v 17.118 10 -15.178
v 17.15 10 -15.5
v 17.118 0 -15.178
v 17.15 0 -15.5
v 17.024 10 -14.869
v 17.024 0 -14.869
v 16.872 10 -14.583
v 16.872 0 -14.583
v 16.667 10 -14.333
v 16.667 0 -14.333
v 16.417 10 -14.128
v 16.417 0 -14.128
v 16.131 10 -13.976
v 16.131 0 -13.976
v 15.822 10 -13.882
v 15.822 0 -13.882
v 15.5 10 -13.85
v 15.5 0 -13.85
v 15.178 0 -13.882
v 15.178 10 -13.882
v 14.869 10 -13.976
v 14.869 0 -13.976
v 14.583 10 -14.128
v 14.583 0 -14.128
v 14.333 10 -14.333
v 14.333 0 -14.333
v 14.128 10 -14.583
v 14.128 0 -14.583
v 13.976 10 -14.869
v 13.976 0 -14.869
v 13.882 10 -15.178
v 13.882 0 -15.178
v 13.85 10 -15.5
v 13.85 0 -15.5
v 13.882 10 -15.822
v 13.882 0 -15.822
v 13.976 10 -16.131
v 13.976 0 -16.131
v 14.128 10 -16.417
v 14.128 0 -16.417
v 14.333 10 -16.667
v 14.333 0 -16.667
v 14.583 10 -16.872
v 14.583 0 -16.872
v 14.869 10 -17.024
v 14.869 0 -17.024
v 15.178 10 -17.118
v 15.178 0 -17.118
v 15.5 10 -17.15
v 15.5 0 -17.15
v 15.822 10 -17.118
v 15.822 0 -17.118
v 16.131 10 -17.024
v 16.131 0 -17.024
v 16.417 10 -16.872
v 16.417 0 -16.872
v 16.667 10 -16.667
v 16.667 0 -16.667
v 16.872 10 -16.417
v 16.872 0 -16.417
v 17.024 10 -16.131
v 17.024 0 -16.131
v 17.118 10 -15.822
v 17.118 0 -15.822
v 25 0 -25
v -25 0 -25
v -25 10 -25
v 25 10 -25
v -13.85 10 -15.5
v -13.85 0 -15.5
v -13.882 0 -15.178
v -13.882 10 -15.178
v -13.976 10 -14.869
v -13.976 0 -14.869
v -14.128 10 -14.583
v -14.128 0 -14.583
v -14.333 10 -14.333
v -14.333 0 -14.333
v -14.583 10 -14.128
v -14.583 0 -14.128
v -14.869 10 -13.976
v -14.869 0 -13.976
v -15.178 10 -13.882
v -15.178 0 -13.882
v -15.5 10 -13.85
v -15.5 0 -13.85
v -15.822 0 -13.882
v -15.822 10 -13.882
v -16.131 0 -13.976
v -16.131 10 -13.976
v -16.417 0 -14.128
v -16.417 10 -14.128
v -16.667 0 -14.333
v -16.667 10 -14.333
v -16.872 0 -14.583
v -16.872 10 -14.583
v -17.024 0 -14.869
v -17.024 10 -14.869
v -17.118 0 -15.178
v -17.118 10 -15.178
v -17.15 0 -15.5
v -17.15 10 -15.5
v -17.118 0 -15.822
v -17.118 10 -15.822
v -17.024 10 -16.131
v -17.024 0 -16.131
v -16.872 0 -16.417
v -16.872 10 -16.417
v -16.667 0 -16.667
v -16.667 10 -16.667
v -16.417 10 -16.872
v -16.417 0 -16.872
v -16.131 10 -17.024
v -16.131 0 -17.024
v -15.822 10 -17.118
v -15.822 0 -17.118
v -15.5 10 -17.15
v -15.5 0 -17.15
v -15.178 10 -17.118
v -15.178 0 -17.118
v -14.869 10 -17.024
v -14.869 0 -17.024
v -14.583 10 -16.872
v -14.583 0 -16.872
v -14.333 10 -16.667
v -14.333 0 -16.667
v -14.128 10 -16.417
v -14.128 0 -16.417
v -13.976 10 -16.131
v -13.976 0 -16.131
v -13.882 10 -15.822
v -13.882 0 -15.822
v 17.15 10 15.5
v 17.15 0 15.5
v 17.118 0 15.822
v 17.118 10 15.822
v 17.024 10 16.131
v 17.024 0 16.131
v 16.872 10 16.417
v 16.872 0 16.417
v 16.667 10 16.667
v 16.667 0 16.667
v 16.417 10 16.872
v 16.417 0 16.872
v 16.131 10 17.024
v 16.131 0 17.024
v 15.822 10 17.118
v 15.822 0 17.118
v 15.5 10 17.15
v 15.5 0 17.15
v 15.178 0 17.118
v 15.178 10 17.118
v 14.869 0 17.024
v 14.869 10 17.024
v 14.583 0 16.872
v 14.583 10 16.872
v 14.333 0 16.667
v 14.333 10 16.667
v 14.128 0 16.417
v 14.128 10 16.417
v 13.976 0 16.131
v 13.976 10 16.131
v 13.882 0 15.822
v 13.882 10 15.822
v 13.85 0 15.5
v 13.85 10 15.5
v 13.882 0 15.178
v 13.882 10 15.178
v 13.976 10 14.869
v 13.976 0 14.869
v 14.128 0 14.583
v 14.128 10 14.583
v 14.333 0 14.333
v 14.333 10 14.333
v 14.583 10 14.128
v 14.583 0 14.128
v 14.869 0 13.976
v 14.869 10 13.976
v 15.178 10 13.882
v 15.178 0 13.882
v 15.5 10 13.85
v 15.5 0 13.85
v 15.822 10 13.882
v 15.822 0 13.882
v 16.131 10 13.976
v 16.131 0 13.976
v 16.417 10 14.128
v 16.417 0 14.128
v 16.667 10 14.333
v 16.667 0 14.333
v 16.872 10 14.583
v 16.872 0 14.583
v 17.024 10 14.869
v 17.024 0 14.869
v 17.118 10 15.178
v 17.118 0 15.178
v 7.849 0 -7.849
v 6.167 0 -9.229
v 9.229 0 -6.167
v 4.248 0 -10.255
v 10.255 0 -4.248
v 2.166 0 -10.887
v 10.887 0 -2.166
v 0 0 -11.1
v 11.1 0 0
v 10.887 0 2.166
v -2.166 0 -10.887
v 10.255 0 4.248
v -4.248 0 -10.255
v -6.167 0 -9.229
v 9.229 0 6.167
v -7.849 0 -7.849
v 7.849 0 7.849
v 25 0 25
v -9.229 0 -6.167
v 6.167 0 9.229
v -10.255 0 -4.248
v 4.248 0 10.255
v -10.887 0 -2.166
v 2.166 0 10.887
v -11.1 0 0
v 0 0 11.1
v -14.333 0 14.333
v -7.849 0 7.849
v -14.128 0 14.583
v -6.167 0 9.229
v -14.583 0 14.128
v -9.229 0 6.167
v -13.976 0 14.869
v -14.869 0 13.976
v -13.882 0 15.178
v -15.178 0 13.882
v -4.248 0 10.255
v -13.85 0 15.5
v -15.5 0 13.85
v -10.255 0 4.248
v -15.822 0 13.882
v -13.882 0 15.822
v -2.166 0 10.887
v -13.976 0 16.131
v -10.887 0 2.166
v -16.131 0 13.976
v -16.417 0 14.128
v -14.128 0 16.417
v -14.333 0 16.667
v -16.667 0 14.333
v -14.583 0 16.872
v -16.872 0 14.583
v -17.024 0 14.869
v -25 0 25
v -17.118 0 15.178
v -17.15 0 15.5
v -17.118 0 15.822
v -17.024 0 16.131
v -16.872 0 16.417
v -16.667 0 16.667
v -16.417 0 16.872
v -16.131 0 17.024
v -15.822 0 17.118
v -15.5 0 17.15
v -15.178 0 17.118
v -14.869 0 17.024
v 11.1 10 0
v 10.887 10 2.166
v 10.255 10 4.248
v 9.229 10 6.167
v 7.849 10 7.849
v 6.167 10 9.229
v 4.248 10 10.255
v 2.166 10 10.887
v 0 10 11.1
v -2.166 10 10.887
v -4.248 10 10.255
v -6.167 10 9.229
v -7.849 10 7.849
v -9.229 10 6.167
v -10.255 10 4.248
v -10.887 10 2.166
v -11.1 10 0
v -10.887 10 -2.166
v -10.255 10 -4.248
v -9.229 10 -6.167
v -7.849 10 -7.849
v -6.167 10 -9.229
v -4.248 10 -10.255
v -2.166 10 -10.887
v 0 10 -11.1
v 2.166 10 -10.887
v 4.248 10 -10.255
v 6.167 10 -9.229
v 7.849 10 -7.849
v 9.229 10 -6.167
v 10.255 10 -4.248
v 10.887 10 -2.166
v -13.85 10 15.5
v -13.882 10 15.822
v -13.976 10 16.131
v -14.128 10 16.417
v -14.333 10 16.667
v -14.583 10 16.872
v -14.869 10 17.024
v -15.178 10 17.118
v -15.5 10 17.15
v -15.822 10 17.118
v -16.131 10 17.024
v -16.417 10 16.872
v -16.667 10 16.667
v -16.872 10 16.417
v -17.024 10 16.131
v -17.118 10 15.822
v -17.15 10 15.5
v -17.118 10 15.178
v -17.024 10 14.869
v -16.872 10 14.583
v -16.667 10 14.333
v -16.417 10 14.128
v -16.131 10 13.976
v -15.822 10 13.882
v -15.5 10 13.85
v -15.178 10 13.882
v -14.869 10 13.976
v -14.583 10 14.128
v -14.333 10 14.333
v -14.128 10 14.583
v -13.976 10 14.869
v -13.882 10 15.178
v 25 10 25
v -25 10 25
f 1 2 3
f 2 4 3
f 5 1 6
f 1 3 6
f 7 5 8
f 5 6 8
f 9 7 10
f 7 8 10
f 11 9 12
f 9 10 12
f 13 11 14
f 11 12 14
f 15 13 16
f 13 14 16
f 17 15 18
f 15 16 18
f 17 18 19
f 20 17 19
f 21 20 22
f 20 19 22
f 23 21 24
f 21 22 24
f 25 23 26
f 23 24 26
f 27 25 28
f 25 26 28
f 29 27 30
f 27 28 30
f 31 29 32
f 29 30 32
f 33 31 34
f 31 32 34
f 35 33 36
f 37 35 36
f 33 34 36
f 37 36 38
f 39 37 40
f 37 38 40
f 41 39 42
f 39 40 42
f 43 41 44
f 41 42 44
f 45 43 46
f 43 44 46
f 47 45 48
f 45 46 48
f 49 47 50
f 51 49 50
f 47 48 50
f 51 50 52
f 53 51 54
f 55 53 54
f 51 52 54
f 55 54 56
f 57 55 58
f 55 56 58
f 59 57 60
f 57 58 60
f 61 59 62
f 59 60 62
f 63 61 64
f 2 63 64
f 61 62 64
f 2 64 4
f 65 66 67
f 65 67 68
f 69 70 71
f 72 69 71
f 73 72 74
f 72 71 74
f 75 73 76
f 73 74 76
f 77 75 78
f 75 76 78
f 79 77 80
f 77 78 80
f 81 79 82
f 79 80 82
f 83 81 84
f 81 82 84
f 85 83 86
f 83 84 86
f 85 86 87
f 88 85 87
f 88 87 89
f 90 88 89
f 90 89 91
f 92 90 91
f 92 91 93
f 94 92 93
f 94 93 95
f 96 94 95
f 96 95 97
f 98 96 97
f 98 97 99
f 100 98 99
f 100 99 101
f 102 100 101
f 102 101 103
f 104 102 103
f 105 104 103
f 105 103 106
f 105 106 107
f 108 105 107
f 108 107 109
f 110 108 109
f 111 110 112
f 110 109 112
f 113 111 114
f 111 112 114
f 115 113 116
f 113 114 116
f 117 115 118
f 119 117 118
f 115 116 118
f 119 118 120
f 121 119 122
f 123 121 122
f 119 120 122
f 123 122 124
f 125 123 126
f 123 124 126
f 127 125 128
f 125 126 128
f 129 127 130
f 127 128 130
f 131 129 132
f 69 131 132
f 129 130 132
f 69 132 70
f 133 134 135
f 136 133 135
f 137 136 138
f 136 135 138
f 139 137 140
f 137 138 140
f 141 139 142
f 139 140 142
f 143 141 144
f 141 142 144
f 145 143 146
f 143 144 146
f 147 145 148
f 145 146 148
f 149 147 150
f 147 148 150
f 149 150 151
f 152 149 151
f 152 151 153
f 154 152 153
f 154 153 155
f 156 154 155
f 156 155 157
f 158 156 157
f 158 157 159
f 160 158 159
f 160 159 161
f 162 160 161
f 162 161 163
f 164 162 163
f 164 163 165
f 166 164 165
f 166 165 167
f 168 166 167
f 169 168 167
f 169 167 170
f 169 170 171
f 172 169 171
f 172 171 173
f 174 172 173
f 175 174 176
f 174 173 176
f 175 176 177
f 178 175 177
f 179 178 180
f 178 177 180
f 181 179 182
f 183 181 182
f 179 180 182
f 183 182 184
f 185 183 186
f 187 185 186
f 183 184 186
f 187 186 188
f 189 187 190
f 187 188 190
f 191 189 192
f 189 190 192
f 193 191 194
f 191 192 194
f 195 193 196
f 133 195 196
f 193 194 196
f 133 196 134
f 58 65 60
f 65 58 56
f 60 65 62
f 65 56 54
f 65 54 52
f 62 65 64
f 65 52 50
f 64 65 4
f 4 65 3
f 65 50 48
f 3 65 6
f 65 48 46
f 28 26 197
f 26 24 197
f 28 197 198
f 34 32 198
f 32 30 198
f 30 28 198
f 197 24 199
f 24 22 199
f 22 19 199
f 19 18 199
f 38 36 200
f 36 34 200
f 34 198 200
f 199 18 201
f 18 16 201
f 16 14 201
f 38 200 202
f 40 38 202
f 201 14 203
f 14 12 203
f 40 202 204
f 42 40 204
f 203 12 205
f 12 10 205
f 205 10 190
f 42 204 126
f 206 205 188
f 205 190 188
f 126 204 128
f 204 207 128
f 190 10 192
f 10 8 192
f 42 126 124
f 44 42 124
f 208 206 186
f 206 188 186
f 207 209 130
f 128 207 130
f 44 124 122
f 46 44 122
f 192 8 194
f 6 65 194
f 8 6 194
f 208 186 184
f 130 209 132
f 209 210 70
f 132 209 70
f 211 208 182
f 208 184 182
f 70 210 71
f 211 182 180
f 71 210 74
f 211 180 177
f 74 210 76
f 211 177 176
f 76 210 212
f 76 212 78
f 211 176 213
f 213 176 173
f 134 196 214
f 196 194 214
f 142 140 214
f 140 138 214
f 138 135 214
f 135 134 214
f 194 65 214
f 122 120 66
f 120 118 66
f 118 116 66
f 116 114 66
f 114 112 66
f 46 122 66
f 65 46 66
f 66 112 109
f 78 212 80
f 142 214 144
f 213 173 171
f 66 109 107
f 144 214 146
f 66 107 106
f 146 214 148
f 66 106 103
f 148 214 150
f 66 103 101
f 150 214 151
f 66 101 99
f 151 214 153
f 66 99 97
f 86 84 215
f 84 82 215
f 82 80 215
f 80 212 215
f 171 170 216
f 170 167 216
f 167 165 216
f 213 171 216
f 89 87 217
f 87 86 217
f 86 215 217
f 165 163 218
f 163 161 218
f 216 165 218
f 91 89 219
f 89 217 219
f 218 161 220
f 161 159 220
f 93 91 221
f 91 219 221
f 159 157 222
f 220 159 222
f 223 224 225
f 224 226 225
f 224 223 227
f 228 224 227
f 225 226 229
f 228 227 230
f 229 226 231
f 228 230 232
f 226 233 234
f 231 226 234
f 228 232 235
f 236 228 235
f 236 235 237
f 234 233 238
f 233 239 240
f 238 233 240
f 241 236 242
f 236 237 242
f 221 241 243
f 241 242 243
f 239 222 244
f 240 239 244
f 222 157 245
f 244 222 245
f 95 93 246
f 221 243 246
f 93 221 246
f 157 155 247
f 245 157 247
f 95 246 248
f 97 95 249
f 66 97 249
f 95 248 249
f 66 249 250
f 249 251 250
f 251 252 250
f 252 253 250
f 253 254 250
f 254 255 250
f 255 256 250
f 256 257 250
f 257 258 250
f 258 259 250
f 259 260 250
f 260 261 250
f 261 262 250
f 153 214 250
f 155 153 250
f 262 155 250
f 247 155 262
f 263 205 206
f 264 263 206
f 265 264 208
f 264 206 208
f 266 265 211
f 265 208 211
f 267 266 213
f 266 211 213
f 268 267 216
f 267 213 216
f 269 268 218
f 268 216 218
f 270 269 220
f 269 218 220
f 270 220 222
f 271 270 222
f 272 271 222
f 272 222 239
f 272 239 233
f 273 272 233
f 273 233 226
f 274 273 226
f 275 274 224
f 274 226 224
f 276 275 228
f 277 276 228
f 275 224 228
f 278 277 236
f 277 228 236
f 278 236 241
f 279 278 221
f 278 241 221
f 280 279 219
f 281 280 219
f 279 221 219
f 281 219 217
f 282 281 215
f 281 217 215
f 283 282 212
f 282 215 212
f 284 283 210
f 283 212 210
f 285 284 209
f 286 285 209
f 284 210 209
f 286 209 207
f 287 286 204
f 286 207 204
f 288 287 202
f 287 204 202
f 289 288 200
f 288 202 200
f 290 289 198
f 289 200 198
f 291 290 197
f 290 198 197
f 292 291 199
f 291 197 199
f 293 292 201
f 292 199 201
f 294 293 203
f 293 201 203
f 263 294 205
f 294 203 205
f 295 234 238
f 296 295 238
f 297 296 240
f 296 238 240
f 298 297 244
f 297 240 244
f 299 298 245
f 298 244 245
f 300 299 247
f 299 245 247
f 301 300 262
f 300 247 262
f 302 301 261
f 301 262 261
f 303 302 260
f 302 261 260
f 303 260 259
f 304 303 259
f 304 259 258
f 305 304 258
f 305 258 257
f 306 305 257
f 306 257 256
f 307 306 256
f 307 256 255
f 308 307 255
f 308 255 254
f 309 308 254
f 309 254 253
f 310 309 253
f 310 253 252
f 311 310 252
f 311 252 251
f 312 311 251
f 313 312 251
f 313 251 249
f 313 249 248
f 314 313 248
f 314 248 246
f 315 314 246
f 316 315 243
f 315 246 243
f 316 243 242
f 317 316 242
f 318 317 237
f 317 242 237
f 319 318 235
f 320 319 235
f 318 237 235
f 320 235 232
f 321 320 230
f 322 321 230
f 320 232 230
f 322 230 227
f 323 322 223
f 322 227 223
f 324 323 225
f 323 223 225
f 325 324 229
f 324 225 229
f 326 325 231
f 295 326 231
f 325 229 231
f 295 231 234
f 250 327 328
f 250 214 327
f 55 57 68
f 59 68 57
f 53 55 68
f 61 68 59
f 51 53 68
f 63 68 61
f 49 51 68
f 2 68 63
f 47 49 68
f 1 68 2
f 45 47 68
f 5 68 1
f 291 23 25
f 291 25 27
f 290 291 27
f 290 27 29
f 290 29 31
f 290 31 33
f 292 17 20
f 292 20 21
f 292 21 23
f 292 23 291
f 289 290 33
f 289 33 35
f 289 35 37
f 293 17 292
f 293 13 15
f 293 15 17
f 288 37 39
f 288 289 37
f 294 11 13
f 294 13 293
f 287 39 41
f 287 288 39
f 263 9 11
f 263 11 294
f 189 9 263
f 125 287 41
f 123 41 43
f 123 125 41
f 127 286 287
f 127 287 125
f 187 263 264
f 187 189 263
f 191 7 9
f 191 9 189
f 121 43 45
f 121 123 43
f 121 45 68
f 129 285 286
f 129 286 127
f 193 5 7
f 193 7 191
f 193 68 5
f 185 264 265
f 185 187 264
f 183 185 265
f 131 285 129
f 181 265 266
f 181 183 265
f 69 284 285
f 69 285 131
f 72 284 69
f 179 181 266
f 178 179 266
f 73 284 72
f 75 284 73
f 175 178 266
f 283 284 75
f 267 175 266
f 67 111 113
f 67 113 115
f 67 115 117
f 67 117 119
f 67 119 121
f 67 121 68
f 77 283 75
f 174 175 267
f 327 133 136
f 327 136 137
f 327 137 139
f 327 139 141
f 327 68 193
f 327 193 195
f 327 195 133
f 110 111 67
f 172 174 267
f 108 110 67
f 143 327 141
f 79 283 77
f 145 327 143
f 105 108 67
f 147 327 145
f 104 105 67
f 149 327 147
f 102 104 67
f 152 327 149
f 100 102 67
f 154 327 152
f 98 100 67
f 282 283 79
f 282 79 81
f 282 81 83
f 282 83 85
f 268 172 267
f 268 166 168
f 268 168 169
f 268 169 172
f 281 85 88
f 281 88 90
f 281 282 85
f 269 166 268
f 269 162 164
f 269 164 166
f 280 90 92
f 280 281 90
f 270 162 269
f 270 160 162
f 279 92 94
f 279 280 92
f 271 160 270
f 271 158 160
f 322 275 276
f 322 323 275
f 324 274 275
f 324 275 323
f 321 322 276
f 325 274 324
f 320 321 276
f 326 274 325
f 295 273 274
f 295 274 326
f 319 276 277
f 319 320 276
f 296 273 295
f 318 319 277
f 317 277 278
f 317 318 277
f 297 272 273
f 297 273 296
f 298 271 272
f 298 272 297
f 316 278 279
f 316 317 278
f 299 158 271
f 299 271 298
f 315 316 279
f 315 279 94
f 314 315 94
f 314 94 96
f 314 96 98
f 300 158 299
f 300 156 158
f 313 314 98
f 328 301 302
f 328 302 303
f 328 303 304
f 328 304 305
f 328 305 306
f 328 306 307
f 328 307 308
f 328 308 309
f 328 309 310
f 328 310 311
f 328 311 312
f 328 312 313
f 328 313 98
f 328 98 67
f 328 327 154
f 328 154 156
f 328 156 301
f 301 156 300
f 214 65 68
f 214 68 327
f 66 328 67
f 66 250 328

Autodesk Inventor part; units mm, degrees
ref_plane "YZ Plane" through (0, 0, 0) normal (1, 0, 0) x (0, 1, 0)
ref_plane "XZ Plane" through (0, 0, 0) normal (0, 1, 0) x (-1, 0, 0)
ref_plane "XY Plane" through (0, 0, 0) normal (0, 0, 1) x (1, 0, 0)
sketch "Sketch1" plane through (0, 0, 0) normal (0, 1, 0) x (-1, 0, 0)
  line L0 (25, -25) -> (-25, -25)
  line L1 (-25, -25) -> (-25, 25)
  line L2 (-25, 25) -> (25, 25)
  line L3 (25, 25) -> (25, -25)
  line L4 (25, -25) -> (-25, 25) construction
  line L5 (-25, -25) -> (25, 25) construction
  point P0 (0, 0)
  dimension "d0" = 50
  dimension "d1" = 50
extrude "Extrusion1" add sketch "Sketch1" along normal blind 10
sketch "Sketch7" plane through (0, 0, 0) normal (0, -1, 0) x (1, 0, 0)
  circle A0 centre (0, 0) radius 11.1
  line L0 (-15.5, -15.5) -> (15.5, -15.5)
  line L1 (15.5, -15.5) -> (15.5, 15.5)
  line L2 (15.5, 15.5) -> (-15.5, 15.5)
  line L3 (-15.5, 15.5) -> (-15.5, -15.5)
  line L4 (-15.5, -15.5) -> (15.5, 15.5) construction
  line L5 (15.5, -15.5) -> (-15.5, 15.5) construction
  circle A1 centre (-15.5, 15.5) radius 1.65
  circle A2 centre (-15.5, -15.5) radius 1.65
  circle A3 centre (15.5, -15.5) radius 1.65
  circle A4 centre (15.5, 15.5) radius 1.65
  dimension "d60" = 22.2
  dimension "d61" = 31
  dimension "d62" = 31
  dimension "d63" = 3.3
  dimension "d66" = 360
extrude "Extrusion6" cut sketch "Sketch7" against normal up to next contours A0 | L3 A2 L0 | L0 A2 L3 | A3 L1 L0 | L0 L1 A3 | A1 L2 L3 | L3 L2 A1 | A4 L2 L1 | L1 L2 A4
sketch "Sketch4" plane through (0, 0, 0) normal (0, -1, 0) x (1, 0, 0)
  line L0 (25, -25) -> (25, 25) projected
  line L1 (0, -22.2) -> (0, 22.2) construction
  line L2 (11.5, -22.2) -> (11.5, 22.2)
  line L3 (-11.5, 22.2) -> (-11.5, -22.2)
  arc A0 (-11.5, -22.2) -> (11.5, -22.2) centre (0, -22.2) ccw
  arc A1 (11.5, 22.2) -> (-11.5, 22.2) centre (0, 22.2) ccw
  line L4 (15.5, -15.5) -> (-15.5, -15.5)
  line L5 (-15.5, -15.5) -> (-15.5, 15.5)
  line L6 (-15.5, 15.5) -> (15.5, 15.5)
  line L7 (15.5, 15.5) -> (15.5, -15.5)
  line L8 (15.5, -15.5) -> (-15.5, 15.5) construction
  line L9 (-15.5, -15.5) -> (15.5, 15.5) construction
  line L10 (-15.5, -6.7) -> (-15.5, 37.7) construction
  line L11 (-13.85, -6.7) -> (-13.85, 37.7)
  line L12 (-17.15, 37.7) -> (-17.15, -6.7)
  arc A2 (-17.15, -6.7) -> (-13.85, -6.7) centre (-15.5, -6.7) ccw
  arc A3 (-13.85, 37.7) -> (-17.15, 37.7) centre (-15.5, 37.7) ccw
  line L13 (15.5, -6.7) -> (15.5, 37.7) construction
  line L14 (17.15, -6.7) -> (17.15, 37.7)
  line L15 (13.85, 37.7) -> (13.85, -6.7)
  arc A4 (13.85, -6.7) -> (17.15, -6.7) centre (15.5, -6.7) ccw
  arc A5 (17.15, 37.7) -> (13.85, 37.7) centre (15.5, 37.7) ccw
  line L16 (-15.5, -37.7) -> (-15.5, 6.7) construction
  line L17 (-13.85, -37.7) -> (-13.85, 6.7)
  line L18 (-17.15, 6.7) -> (-17.15, -37.7)
  arc A6 (-17.15, -37.7) -> (-13.85, -37.7) centre (-15.5, -37.7) ccw
  arc A7 (-13.85, 6.7) -> (-17.15, 6.7) centre (-15.5, 6.7) ccw
  line L19 (15.5, -37.7) -> (15.5, 6.7) construction
  line L20 (17.15, -37.7) -> (17.15, 6.7)
  line L21 (13.85, 6.7) -> (13.85, -37.7)
  arc A8 (13.85, -37.7) -> (17.15, -37.7) centre (15.5, -37.7) ccw
  arc A9 (17.15, 6.7) -> (13.85, 6.7) centre (15.5, 6.7) ccw
  line L22 (25, -25) -> (-25, -25)
  line L23 (-25, -25) -> (-25, 25)
  line L24 (-25, 25) -> (25, 25)
  line L25 (25, 25) -> (25, -25)
  line L26 (25, -25) -> (-25, 25) construction
  line L27 (-25, -25) -> (25, 25) construction
  line L28 (0, 0) -> (0, 25)
  line L29 (0, 0) -> (-25, 0)
  line L30 (0, 0) -> (25, 0)
  line L31 (0, 0) -> (0, -25)
  dimension "d25" = 22.2
  dimension "d26" = 23
  dimension "d27" = 31
  dimension "d28" = 31
  dimension "d29" = 22.2
  dimension "d30" = 3.3
  dimension "d31" = 22.2
  dimension "d32" = 3.3
  dimension "d33" = 22.2
  dimension "d34" = 3.3
  dimension "d35" = 22.2
  dimension "d36" = 3.3
equation "\"d60\" = center_hole"
equation "\"d63\" = mount_hole"
equation "\"d25\" = center_hole"
equation "\"d29\" = center_hole"
equation "\"d31\" = center_hole"
equation "\"d33\" = center_hole"
equation "\"d35\" = center_hole"
equation "\"center_hole\" = 22.2"
equation "\"mount_hole\" = 3.3"
properties part number "nema17gen"
